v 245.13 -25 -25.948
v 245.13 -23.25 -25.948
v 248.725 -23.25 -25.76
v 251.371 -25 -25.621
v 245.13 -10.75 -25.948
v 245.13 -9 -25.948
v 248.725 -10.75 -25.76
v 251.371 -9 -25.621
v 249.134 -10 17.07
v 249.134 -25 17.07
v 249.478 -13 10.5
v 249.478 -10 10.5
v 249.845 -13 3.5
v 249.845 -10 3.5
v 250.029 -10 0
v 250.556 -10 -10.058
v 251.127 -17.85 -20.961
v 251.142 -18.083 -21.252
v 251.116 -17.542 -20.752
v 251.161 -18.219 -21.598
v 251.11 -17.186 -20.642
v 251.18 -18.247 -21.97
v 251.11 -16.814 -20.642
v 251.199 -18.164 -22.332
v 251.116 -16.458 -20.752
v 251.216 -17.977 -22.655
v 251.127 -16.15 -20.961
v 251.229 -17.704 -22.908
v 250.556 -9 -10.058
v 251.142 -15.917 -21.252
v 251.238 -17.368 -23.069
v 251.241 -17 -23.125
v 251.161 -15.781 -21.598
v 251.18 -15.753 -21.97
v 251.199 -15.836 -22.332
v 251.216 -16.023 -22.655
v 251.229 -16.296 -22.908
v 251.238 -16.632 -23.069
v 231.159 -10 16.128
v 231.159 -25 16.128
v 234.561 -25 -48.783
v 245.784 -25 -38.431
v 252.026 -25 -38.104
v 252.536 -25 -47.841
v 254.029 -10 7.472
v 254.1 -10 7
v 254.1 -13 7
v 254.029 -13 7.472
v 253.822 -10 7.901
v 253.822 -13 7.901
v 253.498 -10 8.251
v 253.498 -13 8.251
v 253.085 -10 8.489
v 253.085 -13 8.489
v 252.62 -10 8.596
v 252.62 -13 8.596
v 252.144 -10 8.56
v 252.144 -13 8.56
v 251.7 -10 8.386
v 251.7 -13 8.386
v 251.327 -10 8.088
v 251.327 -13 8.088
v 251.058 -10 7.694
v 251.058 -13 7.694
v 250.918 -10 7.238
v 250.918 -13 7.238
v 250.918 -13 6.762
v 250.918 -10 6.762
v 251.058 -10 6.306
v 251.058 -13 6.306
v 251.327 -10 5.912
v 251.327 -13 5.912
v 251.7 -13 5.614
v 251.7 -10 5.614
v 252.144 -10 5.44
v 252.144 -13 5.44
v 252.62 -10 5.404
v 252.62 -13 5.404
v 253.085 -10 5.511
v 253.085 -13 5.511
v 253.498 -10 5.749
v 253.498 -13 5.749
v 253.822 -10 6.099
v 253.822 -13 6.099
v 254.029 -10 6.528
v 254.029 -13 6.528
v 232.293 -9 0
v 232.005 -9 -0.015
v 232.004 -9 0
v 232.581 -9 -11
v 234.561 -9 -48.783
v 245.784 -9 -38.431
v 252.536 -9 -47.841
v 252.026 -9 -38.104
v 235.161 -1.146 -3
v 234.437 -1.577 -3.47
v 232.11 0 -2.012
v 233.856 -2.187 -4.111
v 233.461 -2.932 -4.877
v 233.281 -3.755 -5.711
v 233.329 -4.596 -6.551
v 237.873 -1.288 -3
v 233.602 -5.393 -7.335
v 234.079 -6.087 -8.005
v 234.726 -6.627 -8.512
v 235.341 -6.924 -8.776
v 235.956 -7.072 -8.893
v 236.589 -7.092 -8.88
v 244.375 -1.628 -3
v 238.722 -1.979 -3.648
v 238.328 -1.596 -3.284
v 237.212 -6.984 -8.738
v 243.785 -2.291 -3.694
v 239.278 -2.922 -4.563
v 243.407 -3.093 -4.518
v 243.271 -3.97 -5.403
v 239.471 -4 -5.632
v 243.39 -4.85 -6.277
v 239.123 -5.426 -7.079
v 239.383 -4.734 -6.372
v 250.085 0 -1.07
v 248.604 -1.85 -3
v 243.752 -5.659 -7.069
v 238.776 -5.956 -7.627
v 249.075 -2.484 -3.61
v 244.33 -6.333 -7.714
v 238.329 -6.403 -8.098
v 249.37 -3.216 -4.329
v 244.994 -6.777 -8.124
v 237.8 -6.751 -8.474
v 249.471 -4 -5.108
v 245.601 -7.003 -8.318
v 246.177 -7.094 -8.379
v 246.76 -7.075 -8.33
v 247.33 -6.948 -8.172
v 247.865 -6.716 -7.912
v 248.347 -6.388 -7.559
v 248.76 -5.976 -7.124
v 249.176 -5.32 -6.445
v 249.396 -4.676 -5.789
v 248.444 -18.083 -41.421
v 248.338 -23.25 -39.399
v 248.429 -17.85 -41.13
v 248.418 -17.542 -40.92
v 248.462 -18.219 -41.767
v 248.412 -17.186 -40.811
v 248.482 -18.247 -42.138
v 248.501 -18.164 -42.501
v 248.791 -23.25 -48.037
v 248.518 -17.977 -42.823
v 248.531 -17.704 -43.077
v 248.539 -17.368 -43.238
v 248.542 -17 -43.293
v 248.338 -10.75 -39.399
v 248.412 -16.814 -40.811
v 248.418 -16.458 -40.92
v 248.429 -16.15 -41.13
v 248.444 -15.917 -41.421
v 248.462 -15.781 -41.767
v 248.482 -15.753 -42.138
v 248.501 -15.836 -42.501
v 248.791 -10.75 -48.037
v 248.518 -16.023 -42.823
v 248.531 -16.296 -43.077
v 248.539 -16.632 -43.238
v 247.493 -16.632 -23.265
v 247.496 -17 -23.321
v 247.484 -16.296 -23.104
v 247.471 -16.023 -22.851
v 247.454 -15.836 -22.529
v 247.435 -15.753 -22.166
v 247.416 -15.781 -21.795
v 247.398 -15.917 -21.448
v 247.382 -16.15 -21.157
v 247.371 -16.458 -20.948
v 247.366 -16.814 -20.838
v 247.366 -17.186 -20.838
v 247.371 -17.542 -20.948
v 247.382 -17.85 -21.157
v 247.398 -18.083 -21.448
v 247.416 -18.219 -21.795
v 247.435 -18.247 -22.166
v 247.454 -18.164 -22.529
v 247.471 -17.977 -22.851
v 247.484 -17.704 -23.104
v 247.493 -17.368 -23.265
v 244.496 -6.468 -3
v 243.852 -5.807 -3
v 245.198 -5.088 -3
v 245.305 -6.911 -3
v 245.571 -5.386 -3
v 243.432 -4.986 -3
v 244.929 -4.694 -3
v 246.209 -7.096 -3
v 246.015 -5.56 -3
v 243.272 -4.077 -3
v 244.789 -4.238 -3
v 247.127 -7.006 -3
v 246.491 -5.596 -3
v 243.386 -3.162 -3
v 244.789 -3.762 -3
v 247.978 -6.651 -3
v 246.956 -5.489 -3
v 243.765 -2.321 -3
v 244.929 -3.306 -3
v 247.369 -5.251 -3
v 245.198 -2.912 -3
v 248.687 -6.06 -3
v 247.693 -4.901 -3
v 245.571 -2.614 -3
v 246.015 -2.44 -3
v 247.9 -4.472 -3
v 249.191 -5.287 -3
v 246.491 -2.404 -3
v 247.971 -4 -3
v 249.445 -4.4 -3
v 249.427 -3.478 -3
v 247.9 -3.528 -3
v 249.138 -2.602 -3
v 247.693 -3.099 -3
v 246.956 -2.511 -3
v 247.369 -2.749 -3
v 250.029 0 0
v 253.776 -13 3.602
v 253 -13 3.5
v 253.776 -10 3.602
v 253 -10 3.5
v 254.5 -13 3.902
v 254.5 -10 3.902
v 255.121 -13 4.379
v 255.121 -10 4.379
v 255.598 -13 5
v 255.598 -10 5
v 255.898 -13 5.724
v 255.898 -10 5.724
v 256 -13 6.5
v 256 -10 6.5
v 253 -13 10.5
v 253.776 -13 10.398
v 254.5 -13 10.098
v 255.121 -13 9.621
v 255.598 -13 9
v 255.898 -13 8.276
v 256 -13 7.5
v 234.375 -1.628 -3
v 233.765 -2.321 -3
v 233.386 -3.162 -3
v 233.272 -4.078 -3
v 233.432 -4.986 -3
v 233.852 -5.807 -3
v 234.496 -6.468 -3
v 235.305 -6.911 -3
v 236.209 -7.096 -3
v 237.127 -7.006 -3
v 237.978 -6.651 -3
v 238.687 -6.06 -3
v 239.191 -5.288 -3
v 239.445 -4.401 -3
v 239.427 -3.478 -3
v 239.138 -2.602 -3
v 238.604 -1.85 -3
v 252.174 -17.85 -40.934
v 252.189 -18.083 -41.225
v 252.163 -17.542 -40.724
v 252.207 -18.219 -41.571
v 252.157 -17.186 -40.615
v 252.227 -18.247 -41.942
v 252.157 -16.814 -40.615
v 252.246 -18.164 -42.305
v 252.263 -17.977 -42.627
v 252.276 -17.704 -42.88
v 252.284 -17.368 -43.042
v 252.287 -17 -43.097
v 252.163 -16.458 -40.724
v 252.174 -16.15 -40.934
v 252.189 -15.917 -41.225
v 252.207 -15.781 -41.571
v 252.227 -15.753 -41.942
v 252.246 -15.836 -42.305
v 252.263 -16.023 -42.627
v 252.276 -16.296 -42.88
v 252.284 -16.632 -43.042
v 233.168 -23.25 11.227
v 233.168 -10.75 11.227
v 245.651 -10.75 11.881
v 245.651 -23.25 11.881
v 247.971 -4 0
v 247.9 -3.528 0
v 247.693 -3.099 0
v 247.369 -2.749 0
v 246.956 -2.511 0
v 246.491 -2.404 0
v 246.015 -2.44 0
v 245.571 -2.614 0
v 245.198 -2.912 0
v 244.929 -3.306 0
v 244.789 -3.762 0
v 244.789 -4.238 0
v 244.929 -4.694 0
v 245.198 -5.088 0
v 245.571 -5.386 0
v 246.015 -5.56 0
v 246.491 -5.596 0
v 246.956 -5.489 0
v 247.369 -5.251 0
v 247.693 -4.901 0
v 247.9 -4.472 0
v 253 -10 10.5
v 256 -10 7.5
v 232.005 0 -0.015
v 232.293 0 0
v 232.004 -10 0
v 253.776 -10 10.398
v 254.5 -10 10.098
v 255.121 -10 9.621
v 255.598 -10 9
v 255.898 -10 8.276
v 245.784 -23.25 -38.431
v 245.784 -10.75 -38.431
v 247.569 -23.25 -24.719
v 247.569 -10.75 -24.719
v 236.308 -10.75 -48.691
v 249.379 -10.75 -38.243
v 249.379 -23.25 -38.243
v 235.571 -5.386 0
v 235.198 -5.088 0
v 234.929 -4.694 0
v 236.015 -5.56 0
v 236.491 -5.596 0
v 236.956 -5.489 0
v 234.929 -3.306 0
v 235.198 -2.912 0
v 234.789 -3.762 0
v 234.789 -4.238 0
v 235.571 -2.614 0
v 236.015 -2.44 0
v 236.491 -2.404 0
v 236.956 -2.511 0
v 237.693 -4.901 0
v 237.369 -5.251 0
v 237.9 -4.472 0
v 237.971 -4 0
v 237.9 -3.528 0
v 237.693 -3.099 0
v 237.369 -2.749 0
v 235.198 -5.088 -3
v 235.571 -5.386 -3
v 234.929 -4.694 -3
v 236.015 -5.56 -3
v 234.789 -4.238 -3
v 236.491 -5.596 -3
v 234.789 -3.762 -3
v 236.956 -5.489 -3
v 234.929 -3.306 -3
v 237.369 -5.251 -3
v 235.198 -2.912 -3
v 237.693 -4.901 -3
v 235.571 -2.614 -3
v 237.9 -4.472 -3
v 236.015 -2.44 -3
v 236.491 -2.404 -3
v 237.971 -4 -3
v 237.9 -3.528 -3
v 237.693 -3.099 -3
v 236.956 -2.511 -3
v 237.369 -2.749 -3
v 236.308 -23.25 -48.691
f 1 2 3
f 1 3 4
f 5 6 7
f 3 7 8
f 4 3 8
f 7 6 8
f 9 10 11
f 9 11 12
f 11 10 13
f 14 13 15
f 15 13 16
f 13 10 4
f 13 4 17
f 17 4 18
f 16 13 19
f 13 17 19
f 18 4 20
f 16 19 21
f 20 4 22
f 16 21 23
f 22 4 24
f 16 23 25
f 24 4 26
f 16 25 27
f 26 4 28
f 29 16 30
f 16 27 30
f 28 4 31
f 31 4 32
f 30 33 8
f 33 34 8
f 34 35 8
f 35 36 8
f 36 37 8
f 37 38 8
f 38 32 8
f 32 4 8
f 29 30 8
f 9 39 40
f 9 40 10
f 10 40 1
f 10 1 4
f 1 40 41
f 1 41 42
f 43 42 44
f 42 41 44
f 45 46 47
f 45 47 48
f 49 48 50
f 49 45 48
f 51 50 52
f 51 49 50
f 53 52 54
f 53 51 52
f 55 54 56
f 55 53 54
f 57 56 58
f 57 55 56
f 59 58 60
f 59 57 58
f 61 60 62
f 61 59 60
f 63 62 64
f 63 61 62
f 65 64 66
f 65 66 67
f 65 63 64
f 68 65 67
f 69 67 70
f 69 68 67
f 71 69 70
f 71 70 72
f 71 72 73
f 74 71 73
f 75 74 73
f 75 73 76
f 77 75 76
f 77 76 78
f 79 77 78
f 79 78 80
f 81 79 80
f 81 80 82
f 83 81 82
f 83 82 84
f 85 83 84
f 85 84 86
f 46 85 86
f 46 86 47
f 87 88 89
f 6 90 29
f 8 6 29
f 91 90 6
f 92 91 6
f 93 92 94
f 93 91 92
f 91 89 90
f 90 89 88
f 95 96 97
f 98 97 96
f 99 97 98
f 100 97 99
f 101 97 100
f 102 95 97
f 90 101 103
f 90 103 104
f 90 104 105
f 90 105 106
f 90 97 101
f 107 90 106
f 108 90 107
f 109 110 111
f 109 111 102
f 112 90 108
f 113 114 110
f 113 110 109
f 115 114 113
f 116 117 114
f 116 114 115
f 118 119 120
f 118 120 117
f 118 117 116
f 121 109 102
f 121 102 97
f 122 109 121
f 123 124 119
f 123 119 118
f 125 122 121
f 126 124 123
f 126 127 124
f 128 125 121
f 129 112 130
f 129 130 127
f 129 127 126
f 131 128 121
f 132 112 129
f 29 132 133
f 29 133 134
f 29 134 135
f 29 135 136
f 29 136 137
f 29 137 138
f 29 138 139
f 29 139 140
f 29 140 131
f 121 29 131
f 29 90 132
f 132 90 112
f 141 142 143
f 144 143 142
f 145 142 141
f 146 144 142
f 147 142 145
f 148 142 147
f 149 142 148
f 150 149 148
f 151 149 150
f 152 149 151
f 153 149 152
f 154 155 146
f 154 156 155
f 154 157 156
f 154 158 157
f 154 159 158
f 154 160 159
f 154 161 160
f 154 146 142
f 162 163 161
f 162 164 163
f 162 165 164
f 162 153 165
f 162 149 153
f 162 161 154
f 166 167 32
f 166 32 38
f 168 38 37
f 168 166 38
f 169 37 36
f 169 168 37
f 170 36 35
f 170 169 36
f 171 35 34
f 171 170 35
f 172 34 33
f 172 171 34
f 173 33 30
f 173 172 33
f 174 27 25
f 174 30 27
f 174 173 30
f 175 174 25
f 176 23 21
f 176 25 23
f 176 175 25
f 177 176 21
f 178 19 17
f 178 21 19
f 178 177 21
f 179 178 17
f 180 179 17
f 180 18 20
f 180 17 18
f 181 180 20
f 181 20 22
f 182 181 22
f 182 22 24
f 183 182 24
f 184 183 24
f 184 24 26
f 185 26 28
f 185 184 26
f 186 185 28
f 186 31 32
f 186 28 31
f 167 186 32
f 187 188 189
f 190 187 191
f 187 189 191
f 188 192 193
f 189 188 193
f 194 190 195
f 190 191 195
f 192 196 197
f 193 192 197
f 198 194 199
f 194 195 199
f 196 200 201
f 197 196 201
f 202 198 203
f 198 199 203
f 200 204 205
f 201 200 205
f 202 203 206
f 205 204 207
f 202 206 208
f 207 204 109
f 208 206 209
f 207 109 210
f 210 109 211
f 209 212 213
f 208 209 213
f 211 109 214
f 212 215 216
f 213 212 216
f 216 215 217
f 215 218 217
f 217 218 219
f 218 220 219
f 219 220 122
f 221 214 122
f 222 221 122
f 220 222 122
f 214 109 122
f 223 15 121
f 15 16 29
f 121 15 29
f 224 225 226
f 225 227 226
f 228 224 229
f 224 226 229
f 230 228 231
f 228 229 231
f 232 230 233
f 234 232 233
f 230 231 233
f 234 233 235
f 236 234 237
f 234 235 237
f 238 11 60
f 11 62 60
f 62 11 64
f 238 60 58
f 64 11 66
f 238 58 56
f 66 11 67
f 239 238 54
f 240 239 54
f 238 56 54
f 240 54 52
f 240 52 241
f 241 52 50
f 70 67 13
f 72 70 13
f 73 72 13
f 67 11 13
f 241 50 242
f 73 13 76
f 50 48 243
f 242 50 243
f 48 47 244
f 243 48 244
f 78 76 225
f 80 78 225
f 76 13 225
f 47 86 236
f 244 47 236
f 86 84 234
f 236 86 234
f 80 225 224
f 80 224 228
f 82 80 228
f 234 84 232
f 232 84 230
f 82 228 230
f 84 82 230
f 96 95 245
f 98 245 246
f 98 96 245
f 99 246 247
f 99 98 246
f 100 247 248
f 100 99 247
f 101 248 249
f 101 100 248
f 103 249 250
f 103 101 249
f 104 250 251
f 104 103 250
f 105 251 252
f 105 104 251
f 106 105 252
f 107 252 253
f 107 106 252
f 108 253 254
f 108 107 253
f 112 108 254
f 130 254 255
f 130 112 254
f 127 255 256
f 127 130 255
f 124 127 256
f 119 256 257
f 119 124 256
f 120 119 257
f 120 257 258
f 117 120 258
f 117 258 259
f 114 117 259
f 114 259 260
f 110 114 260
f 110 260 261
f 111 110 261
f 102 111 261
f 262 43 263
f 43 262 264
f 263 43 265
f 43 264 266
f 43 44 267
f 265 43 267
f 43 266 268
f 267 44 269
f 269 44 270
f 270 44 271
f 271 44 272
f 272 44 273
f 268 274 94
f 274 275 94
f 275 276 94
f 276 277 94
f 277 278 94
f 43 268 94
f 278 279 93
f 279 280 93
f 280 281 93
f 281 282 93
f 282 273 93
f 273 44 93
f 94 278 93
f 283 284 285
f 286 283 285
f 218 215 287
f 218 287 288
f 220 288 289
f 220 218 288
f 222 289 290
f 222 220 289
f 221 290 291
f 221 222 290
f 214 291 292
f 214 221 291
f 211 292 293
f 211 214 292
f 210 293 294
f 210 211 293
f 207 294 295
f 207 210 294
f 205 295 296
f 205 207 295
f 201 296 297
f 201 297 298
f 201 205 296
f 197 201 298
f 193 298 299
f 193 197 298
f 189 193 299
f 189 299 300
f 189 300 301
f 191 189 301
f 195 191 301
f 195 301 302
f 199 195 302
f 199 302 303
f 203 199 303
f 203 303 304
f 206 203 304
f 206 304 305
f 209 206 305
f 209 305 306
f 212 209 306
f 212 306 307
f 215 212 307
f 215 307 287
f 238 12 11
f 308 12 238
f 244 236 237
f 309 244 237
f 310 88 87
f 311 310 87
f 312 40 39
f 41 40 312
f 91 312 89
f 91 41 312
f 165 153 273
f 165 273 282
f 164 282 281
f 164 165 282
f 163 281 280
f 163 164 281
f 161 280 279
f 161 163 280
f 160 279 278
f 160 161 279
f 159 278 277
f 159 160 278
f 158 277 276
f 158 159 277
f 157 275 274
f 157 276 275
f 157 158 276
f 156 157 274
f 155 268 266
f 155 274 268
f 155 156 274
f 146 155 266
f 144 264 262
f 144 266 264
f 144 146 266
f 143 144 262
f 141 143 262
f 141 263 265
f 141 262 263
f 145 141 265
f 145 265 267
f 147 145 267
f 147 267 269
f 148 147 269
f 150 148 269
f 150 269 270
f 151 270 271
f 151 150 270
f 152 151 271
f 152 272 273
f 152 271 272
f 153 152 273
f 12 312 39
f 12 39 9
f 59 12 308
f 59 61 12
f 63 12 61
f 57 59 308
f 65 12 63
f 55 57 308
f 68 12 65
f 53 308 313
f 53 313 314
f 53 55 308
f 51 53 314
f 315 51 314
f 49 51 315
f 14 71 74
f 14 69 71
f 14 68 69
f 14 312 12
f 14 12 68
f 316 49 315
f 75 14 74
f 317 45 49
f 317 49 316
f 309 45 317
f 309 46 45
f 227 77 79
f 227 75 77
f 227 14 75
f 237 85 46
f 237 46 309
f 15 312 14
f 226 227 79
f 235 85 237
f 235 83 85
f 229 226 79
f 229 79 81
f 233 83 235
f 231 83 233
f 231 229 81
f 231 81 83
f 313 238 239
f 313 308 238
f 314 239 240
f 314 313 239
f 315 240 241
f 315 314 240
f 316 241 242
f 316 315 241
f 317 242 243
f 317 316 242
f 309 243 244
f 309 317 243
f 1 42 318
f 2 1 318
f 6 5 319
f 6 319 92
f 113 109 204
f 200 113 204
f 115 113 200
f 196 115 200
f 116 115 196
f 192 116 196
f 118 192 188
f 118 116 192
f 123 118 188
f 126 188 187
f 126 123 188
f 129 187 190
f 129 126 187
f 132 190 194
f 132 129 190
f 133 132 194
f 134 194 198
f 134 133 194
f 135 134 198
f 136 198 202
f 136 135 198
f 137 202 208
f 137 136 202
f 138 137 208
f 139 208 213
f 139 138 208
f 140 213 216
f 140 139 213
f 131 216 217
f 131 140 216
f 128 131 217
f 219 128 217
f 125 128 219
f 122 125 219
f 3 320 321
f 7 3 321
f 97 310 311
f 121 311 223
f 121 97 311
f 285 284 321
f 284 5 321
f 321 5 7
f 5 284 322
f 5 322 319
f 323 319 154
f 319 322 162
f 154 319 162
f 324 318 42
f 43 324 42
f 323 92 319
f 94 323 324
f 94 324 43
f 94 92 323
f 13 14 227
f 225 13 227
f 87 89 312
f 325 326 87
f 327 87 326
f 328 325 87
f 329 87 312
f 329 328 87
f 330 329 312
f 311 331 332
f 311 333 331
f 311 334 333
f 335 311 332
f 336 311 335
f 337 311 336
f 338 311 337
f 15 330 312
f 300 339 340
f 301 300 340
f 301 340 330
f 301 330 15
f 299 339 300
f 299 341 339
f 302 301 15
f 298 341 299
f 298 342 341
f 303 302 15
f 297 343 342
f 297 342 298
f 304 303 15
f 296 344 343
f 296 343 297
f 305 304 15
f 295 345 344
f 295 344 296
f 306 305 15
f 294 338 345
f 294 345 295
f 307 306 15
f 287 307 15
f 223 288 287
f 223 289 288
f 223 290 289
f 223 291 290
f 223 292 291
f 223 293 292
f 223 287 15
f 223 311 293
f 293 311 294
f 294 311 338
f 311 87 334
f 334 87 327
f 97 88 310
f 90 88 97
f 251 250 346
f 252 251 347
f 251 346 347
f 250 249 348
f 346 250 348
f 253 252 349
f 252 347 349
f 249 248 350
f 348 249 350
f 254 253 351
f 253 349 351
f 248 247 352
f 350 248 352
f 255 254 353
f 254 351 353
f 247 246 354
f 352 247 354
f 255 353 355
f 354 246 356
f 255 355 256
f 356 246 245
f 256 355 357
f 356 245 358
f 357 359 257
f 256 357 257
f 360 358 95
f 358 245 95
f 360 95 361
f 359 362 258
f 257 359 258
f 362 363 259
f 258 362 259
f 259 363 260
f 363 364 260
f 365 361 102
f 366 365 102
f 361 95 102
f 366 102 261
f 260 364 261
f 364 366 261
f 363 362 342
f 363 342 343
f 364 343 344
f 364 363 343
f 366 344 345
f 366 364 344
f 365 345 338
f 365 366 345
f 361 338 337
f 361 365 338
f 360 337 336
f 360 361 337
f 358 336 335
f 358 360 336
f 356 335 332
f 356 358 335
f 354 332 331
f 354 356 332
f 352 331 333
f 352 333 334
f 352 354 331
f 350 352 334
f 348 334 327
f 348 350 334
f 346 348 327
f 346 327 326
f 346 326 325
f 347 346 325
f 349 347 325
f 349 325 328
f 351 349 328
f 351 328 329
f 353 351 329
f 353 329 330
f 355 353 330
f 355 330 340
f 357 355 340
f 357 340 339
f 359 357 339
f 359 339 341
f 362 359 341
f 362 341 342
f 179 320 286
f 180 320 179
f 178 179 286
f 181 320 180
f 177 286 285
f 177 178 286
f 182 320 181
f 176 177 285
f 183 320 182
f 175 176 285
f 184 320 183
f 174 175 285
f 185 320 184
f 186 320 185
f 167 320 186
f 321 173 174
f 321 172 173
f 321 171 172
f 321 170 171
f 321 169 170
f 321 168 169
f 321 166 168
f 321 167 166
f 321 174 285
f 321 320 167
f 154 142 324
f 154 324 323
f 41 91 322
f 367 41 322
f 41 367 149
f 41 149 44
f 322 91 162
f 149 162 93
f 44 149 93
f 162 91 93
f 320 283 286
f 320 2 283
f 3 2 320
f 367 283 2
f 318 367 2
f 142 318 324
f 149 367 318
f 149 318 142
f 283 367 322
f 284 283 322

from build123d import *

# Parameters (mm, degrees)
BOX190_W                   = 38
BOX190_H                   = 20
BOX190_DEPTH               = 12.5
BOX190_PLACEMENT_ANGLE     = 3
BOX180_W                   = 20
BOX180_H                   = 10
BOX180_DEPTH               = 18
CYLINDER195_R              = 1.25
CYLINDER195_DEPTH          = 10
CYLINDER194_R              = 1.25
CYLINDER194_DEPTH          = 10
BOX106_W                   = 12
BOX106_H                   = 20
BOX106_DEPTH               = 12.5
BOX105_W                   = 12.5
BOX105_H                   = 12.5
BOX105_DEPTH               = 60
BOX104_W                   = 18
BOX104_H                   = 16
BOX104_DEPTH               = 65
CHAMFER014_SIZE            = 1.1
CHAMFER014_PLACEMENT_ANGLE = 3
CYLINDER246_R              = 1.6
CYLINDER246_DEPTH          = 10
BOX189_W                   = 7.5
BOX189_H                   = 3
BOX189_DEPTH               = 7
FILLET071_R                = 3
CYLINDER244_R              = 1.6
CYLINDER244_DEPTH          = 10
CYLINDER245_R              = 3.1
CYLINDER245_DEPTH          = 10
CYLINDER247_R              = 3.1
CYLINDER247_DEPTH          = 10
CYLINDER248_R              = 1.6
CYLINDER248_DEPTH          = 10
BOX188_W                   = 50
BOX188_H                   = 10
BOX188_DEPTH               = 11
BOX187_W                   = 18
BOX187_H                   = 10
BOX187_DEPTH               = 11
BOX187_PLACEMENT_ANGLE     = 3
CHAMFER016_SIZE            = 9


with BuildPart() as cube277:
    # Box190 → Box190 (new body)
    with BuildSketch(Plane.XY):
        with Locations((19, 10)):
            Rectangle(BOX190_W, BOX190_H)
    extrude(amount=BOX190_DEPTH)


with BuildPart() as cube277_1:
    # Box190 placement: moved
    add(cube277.part.moved(Location((223, -16, 15.7))).rotate(Axis((223, -16, 15.7), (0, -1, 0)), BOX190_PLACEMENT_ANGLE))


with BuildPart() as cube267:
    # Box180 → Box180 (new body)
    with BuildSketch(Plane(origin=(231, 0, -7), x_dir=(1, 0, 0), z_dir=(0, 0, 1))):
        with Locations((10, 5)):
            Rectangle(BOX180_W, BOX180_H)
    extrude(amount=BOX180_DEPTH)


with BuildPart() as cylinder482:
    # Cylinder195 → Cylinder195 (new body)
    with BuildSketch(Plane(origin=(323, 0, -39), x_dir=(0, 0, -1), z_dir=(1, 0, 0))):
        Circle(CYLINDER195_R)
    extrude(amount=CYLINDER195_DEPTH)


with BuildPart() as fusion167:
    # Cylinder194 → Cylinder194 (new body)
    with BuildSketch(Plane(origin=(323, 0, -59), x_dir=(0, 0, -1), z_dir=(1, 0, 0))):
        Circle(CYLINDER194_R)
    extrude(amount=CYLINDER194_DEPTH)

    # Fusion167: union Cylinder482
    add(cylinder482.part)


with BuildPart() as fusion167_1:
    # Fusion167 placement: moved
    add(fusion167.part.moved(Location((40, 2, 0))))


with BuildPart() as cube174:
    # Box106 → Box106 (new body)
    with BuildSketch(Plane(origin=(363.75, -10, -55.25), x_dir=(1, 0, 0), z_dir=(0, 0, 1))):
        with Locations((6, 10)):
            Rectangle(BOX106_W, BOX106_H)
    extrude(amount=BOX106_DEPTH)


with BuildPart() as cube173:
    # Box105 → Box105 (new body)
    with BuildSketch(Plane(origin=(353.75, -4.25, -65), x_dir=(1, 0, 0), z_dir=(0, 0, 1))):
        with Locations((6.25, 6.25)):
            Rectangle(BOX105_W, BOX105_H)
    extrude(amount=BOX105_DEPTH)


with BuildPart() as cut190:
    # Box104 → Box104 (new body)
    with BuildSketch(Plane(origin=(352, -6, -65), x_dir=(1, 0, 0), z_dir=(0, 0, 1))):
        with Locations((9, 8)):
            Rectangle(BOX104_W, BOX104_H)
    extrude(amount=BOX104_DEPTH)

    # Cut125: cut Cube173
    add(cube173.part, mode=Mode.SUBTRACT)

    # Cut124: cut Cube174
    add(cube174.part, mode=Mode.SUBTRACT)

    # Cut187: cut Fusion167
    add(fusion167_1.part, mode=Mode.SUBTRACT)


with BuildPart() as cut190_1:
    # Cut187 placement: moved
    add(cut190.part.moved(Location((-120, -9, 10))))

    # Chamfer014
    chamfer014_edges = [cut190_1.edges().sort_by_distance(p)[0] for p in [
        (246.25, -7, -45.25),
        (246.25, -7, -32.75),
    ]]
    chamfer(chamfer014_edges, length=CHAMFER014_SIZE)


with BuildPart() as cut190_2:
    # Chamfer014 placement: moved
    add(cut190_1.part.moved(Location((0, 0, -13))).rotate(Axis((0, 0, -13), (0, -1, 0)), CHAMFER014_PLACEMENT_ANGLE))

    # Cut190: cut Cube267
    add(cube267.part, mode=Mode.SUBTRACT)


with BuildPart() as cut190_3:
    # Cut190 placement: moved
    add(cut190_2.part.moved(Location((0, 0, 7))))


with BuildPart() as cylinder530:
    # Cylinder246 → Cylinder246 (new body)
    with BuildSketch(Plane(origin=(253, 7, 6.5), x_dir=(1, 0, 0), z_dir=(0, -1, 0))):
        Circle(CYLINDER246_R)
    extrude(amount=CYLINDER246_DEPTH)


with BuildPart() as fillet071:
    # Box189 → Box189 (new body)
    with BuildSketch(Plane(origin=(249, -3, 3), x_dir=(1, 0, 0), z_dir=(0, 0, 1))):
        with Locations((3.75, 1.5)):
            Rectangle(BOX189_W, BOX189_H)
    extrude(amount=BOX189_DEPTH)

    # Cut196: cut Cylinder530
    add(cylinder530.part, mode=Mode.SUBTRACT)

    # Fillet071
    fillet071_edges = [fillet071.edges().sort_by_distance(p)[0] for p in [
        (256.5, -1.5, 10),
        (256.5, -1.5, 3),
    ]]
    fillet(fillet071_edges, radius=FILLET071_R)


with BuildPart() as fillet071_1:
    # Fillet071 placement: moved
    add(fillet071.part.moved(Location((-0.5, 0, 0.5))))


with BuildPart() as cylinder528:
    # Cylinder244 → Cylinder244 (new body)
    with BuildSketch(Plane(origin=(246, 6, -9), x_dir=(1, 0, 0), z_dir=(0, 0, 1))):
        Circle(CYLINDER244_R)
    extrude(amount=CYLINDER244_DEPTH)


with BuildPart() as cylinder529:
    # Cylinder245 → Cylinder245 (new body)
    with BuildSketch(Plane(origin=(246, 6, -12), x_dir=(1, 0, 0), z_dir=(0, 0, 1))):
        Circle(CYLINDER245_R)
    extrude(amount=CYLINDER245_DEPTH)


with BuildPart() as cylinder531:
    # Cylinder247 → Cylinder247 (new body)
    with BuildSketch(Plane(origin=(236, 6, -12), x_dir=(1, 0, 0), z_dir=(0, 0, 1))):
        Circle(CYLINDER247_R)
    extrude(amount=CYLINDER247_DEPTH)


with BuildPart() as fusion209:
    # Cylinder248 → Cylinder248 (new body)
    with BuildSketch(Plane(origin=(236, 6, -9), x_dir=(1, 0, 0), z_dir=(0, 0, 1))):
        Circle(CYLINDER248_R)
    extrude(amount=CYLINDER248_DEPTH)

    # Fusion209: union Cylinder528, Cylinder529, Cylinder531
    add(cylinder528.part)
    add(cylinder529.part)
    add(cylinder531.part)


with BuildPart() as fusion209_1:
    # Fusion209 placement: moved
    add(fusion209.part.moved(Location((0, 0, -1))))


with BuildPart() as cube275:
    # Box188 → Box188 (new body)
    with BuildSketch(Plane(origin=(231, 0, 0), x_dir=(1, 0, 0), z_dir=(0, 0, 1))):
        with Locations((25, 5)):
            Rectangle(BOX188_W, BOX188_H)
    extrude(amount=BOX188_DEPTH)


with BuildPart() as supports_left_frame:
    # Box187 → Box187 (new body)
    with BuildSketch(Plane.XY):
        with Locations((9, 5)):
            Rectangle(BOX187_W, BOX187_H)
    extrude(amount=BOX187_DEPTH)


with BuildPart() as supports_left_frame_1:
    # Box187 placement: moved
    add(supports_left_frame.part.moved(Location((232.21, 0, -11))).rotate(Axis((232.21, 0, -11), (0, -1, 0)), BOX187_PLACEMENT_ANGLE))

    # Cut194: cut Cube275
    add(cube275.part, mode=Mode.SUBTRACT)

    # Chamfer016
    chamfer016_edges = [supports_left_frame_1.edges().sort_by_distance(p)[0] for p in [
        (241.197666, 10, -10.528976),
    ]]
    chamfer(chamfer016_edges, length=CHAMFER016_SIZE)

    # Cut195: cut Fusion209
    add(fusion209_1.part, mode=Mode.SUBTRACT)


with BuildPart() as supports_left_frame_2:
    # Cut195 placement: moved
    add(supports_left_frame_1.part.moved(Location((0.371, 0, 0))))

    # Fusion213: union Cut190, Fillet071
    add(cut190_3.part)
    add(fillet071_1.part)

    # Cut197: cut Cube277
    add(cube277_1.part, mode=Mode.SUBTRACT)


with BuildPart() as supports_left_frame_3:
    # Cut197 placement: moved
    add(supports_left_frame_2.part.moved(Location((0, -10, 0))))


solid = supports_left_frame_3.part
